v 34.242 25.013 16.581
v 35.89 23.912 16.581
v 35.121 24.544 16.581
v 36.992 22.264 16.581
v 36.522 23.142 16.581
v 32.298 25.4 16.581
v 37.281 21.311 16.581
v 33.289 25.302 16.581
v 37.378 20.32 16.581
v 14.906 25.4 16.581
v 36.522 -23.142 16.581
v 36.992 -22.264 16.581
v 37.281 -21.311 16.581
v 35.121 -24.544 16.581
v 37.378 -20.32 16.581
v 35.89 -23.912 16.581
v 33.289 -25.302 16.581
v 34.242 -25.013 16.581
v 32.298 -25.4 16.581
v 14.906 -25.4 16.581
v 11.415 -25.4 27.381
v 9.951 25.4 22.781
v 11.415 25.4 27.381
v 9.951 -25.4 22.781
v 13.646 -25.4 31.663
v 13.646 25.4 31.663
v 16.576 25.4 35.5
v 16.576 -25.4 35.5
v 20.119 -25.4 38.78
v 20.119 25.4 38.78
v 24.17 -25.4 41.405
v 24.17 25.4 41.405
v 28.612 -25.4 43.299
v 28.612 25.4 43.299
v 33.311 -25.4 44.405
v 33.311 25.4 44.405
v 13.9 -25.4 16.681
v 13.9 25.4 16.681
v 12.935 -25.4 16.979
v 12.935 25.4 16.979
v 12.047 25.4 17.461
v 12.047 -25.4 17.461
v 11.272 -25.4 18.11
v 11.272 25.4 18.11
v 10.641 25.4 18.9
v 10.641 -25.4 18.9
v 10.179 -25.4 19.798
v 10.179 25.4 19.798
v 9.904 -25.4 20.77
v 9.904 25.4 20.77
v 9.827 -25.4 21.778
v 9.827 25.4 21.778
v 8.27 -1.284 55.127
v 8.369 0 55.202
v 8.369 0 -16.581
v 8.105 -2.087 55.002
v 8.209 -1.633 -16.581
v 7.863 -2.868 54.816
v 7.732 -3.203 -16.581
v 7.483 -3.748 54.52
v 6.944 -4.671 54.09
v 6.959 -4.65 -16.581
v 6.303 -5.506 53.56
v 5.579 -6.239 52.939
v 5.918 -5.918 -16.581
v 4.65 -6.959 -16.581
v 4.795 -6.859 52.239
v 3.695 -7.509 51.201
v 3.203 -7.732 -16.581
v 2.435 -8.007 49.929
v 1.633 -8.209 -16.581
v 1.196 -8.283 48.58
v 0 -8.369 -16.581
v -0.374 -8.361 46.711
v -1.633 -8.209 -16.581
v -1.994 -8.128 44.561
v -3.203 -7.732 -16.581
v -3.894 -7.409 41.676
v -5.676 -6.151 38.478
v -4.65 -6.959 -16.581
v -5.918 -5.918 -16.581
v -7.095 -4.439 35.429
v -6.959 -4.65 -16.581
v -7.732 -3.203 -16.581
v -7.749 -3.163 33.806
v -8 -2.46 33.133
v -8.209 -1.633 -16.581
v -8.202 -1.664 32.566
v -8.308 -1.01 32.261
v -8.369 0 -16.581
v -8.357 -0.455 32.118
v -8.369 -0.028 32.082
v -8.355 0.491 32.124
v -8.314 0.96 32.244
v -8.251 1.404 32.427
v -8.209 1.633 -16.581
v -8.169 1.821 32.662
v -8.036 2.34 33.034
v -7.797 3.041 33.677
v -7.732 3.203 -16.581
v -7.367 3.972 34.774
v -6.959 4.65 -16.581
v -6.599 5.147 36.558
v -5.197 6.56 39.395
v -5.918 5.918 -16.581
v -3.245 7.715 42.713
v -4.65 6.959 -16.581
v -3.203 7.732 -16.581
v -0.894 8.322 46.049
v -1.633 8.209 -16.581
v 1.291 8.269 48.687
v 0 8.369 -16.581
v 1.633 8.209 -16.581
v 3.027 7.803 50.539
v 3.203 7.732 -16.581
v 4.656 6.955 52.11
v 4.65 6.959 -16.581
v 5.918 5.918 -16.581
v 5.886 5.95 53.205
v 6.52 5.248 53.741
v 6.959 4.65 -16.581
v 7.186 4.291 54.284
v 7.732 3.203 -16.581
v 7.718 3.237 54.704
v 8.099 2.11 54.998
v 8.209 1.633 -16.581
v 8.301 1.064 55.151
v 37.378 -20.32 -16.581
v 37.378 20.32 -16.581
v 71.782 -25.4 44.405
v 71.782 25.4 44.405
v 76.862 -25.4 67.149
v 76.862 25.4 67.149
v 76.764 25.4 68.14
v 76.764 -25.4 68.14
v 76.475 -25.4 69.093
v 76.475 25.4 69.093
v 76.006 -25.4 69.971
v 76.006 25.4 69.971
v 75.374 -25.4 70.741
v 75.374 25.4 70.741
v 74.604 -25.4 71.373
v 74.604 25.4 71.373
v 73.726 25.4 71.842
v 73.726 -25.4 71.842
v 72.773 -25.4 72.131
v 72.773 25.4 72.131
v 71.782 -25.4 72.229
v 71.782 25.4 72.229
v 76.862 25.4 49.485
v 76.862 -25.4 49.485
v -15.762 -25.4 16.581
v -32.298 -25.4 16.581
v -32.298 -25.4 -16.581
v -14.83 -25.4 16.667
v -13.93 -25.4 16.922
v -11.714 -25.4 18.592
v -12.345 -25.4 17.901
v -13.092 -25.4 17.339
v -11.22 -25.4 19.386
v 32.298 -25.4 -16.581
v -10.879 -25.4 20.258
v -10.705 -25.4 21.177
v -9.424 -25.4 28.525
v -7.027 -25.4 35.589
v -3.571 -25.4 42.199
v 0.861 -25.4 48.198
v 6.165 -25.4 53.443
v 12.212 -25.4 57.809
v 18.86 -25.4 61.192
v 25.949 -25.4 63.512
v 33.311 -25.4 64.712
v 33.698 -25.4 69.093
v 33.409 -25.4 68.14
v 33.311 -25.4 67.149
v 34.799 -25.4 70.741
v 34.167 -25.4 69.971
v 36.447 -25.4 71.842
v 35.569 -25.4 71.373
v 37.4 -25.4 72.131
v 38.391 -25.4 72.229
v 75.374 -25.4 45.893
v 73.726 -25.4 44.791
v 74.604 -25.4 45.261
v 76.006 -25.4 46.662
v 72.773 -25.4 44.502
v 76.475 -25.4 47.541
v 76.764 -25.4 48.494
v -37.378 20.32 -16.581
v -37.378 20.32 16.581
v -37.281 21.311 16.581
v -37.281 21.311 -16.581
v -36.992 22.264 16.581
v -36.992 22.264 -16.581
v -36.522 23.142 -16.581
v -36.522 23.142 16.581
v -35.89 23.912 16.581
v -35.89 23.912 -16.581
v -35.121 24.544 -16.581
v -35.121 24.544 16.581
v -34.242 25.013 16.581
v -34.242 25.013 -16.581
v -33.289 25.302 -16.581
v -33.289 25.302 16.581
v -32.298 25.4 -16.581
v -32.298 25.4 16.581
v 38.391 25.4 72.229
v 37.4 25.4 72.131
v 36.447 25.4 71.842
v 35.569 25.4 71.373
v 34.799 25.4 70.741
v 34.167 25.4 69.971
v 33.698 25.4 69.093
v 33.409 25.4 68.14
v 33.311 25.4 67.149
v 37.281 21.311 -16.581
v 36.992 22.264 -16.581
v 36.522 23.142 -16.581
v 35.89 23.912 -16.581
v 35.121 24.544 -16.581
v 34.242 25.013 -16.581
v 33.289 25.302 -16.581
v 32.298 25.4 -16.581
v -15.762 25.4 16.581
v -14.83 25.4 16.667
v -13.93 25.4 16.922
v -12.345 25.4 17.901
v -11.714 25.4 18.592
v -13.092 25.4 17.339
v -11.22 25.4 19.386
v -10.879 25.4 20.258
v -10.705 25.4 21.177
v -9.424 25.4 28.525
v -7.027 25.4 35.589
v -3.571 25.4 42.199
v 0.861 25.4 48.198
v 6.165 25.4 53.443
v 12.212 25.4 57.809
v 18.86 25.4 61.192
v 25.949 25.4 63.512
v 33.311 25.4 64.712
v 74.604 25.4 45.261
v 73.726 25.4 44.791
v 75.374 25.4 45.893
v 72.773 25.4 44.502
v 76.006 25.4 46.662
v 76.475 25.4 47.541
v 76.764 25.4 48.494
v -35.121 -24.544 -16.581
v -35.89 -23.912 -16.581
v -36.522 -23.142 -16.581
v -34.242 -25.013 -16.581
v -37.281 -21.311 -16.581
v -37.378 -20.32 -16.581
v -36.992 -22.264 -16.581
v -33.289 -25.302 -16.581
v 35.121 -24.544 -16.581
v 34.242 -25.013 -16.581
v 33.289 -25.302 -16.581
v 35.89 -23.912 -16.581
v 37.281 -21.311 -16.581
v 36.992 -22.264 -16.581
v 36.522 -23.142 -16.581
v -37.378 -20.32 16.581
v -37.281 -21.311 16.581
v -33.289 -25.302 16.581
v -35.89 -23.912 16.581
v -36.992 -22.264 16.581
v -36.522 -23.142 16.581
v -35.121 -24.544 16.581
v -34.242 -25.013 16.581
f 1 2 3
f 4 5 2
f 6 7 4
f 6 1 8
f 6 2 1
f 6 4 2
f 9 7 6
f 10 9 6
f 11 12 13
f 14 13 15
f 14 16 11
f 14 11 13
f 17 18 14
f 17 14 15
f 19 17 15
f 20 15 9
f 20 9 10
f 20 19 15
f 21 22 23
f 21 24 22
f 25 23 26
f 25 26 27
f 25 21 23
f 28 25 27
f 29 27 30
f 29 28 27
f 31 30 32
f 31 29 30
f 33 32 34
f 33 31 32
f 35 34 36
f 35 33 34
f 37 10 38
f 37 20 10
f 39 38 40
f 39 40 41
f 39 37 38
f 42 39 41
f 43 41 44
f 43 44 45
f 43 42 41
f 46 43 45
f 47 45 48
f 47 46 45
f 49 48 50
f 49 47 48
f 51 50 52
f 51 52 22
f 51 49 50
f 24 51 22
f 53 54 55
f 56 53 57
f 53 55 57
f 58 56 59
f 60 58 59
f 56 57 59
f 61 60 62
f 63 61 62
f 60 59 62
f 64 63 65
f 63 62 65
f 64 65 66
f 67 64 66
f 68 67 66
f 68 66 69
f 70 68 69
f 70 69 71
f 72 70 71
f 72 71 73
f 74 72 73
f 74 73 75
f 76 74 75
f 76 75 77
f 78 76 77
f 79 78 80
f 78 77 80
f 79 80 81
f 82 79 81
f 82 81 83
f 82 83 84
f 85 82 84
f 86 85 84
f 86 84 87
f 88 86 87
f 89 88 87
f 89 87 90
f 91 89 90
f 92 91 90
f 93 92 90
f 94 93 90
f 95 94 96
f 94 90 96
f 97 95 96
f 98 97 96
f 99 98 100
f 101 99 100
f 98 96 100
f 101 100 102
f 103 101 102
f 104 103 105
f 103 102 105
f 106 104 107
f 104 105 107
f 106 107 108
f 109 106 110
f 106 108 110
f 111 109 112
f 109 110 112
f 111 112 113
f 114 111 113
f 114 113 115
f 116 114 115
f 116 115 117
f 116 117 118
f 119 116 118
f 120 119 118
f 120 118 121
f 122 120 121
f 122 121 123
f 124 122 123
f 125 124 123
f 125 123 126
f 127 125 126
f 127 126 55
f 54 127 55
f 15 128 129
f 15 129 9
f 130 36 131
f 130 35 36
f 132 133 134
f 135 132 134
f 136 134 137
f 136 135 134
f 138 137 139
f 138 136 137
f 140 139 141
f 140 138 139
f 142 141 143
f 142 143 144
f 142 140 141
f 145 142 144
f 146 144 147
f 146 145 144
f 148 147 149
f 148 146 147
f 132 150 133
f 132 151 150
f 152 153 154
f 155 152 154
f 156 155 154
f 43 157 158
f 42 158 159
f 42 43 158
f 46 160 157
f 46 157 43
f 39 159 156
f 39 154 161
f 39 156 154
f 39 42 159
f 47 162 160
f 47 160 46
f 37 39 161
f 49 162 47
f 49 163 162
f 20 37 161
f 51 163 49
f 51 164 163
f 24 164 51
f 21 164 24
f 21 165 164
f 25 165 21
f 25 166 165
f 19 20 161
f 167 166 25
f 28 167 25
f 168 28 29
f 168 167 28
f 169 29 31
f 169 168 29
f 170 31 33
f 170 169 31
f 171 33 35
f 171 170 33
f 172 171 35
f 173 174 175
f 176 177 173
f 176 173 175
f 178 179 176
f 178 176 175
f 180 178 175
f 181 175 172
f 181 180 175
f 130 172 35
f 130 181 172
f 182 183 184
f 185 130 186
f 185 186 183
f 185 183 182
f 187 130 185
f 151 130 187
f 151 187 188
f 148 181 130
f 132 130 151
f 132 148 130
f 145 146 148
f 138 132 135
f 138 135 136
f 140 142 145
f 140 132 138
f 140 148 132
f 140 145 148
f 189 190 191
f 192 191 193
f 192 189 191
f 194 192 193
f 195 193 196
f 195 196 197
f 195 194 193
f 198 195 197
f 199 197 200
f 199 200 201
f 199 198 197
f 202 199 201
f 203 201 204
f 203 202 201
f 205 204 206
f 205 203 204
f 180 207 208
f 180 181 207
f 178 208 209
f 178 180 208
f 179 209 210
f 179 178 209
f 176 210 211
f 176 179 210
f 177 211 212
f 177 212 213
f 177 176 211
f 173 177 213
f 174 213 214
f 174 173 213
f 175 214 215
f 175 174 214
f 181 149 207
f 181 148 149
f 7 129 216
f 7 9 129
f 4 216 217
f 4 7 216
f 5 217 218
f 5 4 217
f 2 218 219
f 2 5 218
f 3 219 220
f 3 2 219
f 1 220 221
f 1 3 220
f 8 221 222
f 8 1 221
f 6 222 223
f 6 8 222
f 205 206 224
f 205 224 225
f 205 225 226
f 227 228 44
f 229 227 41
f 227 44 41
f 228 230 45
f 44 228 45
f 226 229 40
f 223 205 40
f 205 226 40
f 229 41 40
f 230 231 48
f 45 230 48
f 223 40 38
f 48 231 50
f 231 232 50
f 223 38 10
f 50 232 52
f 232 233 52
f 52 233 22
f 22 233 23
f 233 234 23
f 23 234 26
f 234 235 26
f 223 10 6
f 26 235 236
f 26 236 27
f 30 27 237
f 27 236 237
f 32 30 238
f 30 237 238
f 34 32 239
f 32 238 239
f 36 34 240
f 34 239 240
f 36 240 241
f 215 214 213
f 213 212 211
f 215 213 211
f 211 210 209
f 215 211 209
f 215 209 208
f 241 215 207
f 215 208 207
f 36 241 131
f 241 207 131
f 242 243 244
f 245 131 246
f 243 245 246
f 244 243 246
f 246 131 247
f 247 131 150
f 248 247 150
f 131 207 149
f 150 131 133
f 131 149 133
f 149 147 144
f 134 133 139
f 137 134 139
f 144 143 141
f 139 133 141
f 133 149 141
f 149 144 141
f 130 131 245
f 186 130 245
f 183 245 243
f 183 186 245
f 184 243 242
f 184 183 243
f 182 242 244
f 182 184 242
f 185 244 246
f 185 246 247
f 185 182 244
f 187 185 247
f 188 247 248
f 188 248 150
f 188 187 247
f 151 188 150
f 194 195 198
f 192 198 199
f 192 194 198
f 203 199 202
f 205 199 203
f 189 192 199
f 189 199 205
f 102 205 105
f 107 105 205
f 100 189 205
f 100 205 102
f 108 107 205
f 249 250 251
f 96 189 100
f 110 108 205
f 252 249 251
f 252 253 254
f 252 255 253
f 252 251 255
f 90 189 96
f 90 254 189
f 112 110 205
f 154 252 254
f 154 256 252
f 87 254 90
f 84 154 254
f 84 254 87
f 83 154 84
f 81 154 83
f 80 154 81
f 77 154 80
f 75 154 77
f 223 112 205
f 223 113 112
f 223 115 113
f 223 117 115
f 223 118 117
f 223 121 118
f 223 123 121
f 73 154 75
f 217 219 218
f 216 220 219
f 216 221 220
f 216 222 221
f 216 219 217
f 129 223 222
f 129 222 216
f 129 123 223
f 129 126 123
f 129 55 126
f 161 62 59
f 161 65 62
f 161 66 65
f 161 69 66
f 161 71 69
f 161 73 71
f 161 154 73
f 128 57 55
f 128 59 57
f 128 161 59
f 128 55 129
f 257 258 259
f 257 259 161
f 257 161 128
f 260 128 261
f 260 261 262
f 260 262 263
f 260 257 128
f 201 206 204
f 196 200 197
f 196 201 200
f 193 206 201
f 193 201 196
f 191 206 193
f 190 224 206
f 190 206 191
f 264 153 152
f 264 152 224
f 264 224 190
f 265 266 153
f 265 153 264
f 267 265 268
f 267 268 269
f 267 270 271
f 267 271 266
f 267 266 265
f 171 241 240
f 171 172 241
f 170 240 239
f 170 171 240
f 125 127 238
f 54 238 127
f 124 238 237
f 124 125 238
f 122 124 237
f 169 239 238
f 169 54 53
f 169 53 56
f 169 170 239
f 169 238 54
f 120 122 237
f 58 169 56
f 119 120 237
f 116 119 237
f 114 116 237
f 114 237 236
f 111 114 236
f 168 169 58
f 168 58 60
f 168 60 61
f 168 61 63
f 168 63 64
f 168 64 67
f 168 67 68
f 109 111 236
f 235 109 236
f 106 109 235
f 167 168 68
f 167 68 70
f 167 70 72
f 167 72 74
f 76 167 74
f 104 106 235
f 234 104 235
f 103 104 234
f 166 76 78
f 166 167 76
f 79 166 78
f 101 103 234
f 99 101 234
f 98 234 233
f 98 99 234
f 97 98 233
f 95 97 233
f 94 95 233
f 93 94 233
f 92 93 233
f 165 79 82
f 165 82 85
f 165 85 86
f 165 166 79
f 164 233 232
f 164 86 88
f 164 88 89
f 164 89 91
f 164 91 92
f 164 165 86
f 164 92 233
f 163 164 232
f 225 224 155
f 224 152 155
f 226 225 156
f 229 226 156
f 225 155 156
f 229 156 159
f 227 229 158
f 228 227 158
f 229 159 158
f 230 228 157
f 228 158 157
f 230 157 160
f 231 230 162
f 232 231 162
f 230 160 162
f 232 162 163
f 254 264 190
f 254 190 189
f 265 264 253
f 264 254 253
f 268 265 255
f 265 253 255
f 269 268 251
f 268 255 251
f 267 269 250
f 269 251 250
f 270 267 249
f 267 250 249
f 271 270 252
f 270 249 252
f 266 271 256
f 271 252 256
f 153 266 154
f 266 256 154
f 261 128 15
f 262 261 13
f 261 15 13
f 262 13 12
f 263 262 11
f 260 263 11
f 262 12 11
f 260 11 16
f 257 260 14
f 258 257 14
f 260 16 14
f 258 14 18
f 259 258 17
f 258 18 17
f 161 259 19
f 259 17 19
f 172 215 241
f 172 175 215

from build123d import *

# Parameters (mm, degrees)
F1_DEPTH = 25.4
F2_R     = 5.08
F3_R     = 5.08
F4_R     = 8.3693802945
F5_DEPTH = 99.314


with BuildPart() as f1:
    # F0 (on Front) → F1 (new body, symmetric)
    with BuildSketch(Plane.XZ):
        Polygon((37.378333509, -16.5805853903), (37.378333509, 16.5805853903), (9.2585918344, 16.5805853903), (-10.9242624321, 16.5805853903), (-37.378333509, 16.5805853903), (-37.378333509, -16.5805853903), align=None)
        with BuildLine():
            Line((-10.9242624321, 16.5805853903), (9.2585918344, 16.5805853903))
            ThreePointArc((9.2585918344, 16.5805853903), (16.1053006485, 34.9702005239), (33.311298198, 44.4046594203))
            Line((33.311298198, 44.4046594203), (33.311298198, 64.7116564196))
            ThreePointArc((33.311298198, 64.7116564196), (1.814383096, 49.2661510986), (-10.9242624321, 16.5805853903))
        make_face()
        with BuildLine():
            Line((33.311298198, 72.2287222743), (33.311298198, 64.7116564196))
            ThreePointArc((33.311298198, 64.7116564196), (57.7910346378, 60.35800431), (76.8620222807, 44.4046594203))
            Line((76.8620222807, 44.4046594203), (76.8620222807, 72.2287222743))
            Line((76.8620222807, 72.2287222743), (33.311298198, 72.2287222743))
        make_face()
        with BuildLine():
            Line((33.311298198, 64.7116564196), (33.311298198, 44.4046594203))
            Line((33.311298198, 44.4046594203), (76.8620222807, 44.4046594203))
            ThreePointArc((76.8620222807, 44.4046594203), (57.7910346378, 60.35800431), (33.311298198, 64.7116564196))
        make_face()
    extrude(amount=F1_DEPTH, both=True)

    # F2
    f2_edges = [f1.edges().sort_by_distance(p)[0] for p in [
        (-37.378334, -25.4, 0),
        (37.378334, -25.4, 0),
        (37.378334, 25.4, 0),
        (-37.378334, 25.4, 0),
    ]]
    fillet(f2_edges, radius=F2_R)

    # F3
    f3_edges = [f1.edges().sort_by_distance(p)[0] for p in [
        (9.258592, 0, 16.580585),
        (-10.924262, 0, 16.580585),
        (33.311298, 0, 72.228722),
        (76.862022, 0, 72.228722),
        (76.862022, 0, 44.404659),
    ]]
    fillet(f3_edges, radius=F3_R)

    # F4 (on face) → F5 (cut)
    with BuildSketch(Plane(origin=(0, 0, -16.5805853903), x_dir=(1, 0, 0), z_dir=(0, 0, -1))):
        Circle(F4_R)
    extrude(amount=-F5_DEPTH, mode=Mode.SUBTRACT)


solid = f1.part
